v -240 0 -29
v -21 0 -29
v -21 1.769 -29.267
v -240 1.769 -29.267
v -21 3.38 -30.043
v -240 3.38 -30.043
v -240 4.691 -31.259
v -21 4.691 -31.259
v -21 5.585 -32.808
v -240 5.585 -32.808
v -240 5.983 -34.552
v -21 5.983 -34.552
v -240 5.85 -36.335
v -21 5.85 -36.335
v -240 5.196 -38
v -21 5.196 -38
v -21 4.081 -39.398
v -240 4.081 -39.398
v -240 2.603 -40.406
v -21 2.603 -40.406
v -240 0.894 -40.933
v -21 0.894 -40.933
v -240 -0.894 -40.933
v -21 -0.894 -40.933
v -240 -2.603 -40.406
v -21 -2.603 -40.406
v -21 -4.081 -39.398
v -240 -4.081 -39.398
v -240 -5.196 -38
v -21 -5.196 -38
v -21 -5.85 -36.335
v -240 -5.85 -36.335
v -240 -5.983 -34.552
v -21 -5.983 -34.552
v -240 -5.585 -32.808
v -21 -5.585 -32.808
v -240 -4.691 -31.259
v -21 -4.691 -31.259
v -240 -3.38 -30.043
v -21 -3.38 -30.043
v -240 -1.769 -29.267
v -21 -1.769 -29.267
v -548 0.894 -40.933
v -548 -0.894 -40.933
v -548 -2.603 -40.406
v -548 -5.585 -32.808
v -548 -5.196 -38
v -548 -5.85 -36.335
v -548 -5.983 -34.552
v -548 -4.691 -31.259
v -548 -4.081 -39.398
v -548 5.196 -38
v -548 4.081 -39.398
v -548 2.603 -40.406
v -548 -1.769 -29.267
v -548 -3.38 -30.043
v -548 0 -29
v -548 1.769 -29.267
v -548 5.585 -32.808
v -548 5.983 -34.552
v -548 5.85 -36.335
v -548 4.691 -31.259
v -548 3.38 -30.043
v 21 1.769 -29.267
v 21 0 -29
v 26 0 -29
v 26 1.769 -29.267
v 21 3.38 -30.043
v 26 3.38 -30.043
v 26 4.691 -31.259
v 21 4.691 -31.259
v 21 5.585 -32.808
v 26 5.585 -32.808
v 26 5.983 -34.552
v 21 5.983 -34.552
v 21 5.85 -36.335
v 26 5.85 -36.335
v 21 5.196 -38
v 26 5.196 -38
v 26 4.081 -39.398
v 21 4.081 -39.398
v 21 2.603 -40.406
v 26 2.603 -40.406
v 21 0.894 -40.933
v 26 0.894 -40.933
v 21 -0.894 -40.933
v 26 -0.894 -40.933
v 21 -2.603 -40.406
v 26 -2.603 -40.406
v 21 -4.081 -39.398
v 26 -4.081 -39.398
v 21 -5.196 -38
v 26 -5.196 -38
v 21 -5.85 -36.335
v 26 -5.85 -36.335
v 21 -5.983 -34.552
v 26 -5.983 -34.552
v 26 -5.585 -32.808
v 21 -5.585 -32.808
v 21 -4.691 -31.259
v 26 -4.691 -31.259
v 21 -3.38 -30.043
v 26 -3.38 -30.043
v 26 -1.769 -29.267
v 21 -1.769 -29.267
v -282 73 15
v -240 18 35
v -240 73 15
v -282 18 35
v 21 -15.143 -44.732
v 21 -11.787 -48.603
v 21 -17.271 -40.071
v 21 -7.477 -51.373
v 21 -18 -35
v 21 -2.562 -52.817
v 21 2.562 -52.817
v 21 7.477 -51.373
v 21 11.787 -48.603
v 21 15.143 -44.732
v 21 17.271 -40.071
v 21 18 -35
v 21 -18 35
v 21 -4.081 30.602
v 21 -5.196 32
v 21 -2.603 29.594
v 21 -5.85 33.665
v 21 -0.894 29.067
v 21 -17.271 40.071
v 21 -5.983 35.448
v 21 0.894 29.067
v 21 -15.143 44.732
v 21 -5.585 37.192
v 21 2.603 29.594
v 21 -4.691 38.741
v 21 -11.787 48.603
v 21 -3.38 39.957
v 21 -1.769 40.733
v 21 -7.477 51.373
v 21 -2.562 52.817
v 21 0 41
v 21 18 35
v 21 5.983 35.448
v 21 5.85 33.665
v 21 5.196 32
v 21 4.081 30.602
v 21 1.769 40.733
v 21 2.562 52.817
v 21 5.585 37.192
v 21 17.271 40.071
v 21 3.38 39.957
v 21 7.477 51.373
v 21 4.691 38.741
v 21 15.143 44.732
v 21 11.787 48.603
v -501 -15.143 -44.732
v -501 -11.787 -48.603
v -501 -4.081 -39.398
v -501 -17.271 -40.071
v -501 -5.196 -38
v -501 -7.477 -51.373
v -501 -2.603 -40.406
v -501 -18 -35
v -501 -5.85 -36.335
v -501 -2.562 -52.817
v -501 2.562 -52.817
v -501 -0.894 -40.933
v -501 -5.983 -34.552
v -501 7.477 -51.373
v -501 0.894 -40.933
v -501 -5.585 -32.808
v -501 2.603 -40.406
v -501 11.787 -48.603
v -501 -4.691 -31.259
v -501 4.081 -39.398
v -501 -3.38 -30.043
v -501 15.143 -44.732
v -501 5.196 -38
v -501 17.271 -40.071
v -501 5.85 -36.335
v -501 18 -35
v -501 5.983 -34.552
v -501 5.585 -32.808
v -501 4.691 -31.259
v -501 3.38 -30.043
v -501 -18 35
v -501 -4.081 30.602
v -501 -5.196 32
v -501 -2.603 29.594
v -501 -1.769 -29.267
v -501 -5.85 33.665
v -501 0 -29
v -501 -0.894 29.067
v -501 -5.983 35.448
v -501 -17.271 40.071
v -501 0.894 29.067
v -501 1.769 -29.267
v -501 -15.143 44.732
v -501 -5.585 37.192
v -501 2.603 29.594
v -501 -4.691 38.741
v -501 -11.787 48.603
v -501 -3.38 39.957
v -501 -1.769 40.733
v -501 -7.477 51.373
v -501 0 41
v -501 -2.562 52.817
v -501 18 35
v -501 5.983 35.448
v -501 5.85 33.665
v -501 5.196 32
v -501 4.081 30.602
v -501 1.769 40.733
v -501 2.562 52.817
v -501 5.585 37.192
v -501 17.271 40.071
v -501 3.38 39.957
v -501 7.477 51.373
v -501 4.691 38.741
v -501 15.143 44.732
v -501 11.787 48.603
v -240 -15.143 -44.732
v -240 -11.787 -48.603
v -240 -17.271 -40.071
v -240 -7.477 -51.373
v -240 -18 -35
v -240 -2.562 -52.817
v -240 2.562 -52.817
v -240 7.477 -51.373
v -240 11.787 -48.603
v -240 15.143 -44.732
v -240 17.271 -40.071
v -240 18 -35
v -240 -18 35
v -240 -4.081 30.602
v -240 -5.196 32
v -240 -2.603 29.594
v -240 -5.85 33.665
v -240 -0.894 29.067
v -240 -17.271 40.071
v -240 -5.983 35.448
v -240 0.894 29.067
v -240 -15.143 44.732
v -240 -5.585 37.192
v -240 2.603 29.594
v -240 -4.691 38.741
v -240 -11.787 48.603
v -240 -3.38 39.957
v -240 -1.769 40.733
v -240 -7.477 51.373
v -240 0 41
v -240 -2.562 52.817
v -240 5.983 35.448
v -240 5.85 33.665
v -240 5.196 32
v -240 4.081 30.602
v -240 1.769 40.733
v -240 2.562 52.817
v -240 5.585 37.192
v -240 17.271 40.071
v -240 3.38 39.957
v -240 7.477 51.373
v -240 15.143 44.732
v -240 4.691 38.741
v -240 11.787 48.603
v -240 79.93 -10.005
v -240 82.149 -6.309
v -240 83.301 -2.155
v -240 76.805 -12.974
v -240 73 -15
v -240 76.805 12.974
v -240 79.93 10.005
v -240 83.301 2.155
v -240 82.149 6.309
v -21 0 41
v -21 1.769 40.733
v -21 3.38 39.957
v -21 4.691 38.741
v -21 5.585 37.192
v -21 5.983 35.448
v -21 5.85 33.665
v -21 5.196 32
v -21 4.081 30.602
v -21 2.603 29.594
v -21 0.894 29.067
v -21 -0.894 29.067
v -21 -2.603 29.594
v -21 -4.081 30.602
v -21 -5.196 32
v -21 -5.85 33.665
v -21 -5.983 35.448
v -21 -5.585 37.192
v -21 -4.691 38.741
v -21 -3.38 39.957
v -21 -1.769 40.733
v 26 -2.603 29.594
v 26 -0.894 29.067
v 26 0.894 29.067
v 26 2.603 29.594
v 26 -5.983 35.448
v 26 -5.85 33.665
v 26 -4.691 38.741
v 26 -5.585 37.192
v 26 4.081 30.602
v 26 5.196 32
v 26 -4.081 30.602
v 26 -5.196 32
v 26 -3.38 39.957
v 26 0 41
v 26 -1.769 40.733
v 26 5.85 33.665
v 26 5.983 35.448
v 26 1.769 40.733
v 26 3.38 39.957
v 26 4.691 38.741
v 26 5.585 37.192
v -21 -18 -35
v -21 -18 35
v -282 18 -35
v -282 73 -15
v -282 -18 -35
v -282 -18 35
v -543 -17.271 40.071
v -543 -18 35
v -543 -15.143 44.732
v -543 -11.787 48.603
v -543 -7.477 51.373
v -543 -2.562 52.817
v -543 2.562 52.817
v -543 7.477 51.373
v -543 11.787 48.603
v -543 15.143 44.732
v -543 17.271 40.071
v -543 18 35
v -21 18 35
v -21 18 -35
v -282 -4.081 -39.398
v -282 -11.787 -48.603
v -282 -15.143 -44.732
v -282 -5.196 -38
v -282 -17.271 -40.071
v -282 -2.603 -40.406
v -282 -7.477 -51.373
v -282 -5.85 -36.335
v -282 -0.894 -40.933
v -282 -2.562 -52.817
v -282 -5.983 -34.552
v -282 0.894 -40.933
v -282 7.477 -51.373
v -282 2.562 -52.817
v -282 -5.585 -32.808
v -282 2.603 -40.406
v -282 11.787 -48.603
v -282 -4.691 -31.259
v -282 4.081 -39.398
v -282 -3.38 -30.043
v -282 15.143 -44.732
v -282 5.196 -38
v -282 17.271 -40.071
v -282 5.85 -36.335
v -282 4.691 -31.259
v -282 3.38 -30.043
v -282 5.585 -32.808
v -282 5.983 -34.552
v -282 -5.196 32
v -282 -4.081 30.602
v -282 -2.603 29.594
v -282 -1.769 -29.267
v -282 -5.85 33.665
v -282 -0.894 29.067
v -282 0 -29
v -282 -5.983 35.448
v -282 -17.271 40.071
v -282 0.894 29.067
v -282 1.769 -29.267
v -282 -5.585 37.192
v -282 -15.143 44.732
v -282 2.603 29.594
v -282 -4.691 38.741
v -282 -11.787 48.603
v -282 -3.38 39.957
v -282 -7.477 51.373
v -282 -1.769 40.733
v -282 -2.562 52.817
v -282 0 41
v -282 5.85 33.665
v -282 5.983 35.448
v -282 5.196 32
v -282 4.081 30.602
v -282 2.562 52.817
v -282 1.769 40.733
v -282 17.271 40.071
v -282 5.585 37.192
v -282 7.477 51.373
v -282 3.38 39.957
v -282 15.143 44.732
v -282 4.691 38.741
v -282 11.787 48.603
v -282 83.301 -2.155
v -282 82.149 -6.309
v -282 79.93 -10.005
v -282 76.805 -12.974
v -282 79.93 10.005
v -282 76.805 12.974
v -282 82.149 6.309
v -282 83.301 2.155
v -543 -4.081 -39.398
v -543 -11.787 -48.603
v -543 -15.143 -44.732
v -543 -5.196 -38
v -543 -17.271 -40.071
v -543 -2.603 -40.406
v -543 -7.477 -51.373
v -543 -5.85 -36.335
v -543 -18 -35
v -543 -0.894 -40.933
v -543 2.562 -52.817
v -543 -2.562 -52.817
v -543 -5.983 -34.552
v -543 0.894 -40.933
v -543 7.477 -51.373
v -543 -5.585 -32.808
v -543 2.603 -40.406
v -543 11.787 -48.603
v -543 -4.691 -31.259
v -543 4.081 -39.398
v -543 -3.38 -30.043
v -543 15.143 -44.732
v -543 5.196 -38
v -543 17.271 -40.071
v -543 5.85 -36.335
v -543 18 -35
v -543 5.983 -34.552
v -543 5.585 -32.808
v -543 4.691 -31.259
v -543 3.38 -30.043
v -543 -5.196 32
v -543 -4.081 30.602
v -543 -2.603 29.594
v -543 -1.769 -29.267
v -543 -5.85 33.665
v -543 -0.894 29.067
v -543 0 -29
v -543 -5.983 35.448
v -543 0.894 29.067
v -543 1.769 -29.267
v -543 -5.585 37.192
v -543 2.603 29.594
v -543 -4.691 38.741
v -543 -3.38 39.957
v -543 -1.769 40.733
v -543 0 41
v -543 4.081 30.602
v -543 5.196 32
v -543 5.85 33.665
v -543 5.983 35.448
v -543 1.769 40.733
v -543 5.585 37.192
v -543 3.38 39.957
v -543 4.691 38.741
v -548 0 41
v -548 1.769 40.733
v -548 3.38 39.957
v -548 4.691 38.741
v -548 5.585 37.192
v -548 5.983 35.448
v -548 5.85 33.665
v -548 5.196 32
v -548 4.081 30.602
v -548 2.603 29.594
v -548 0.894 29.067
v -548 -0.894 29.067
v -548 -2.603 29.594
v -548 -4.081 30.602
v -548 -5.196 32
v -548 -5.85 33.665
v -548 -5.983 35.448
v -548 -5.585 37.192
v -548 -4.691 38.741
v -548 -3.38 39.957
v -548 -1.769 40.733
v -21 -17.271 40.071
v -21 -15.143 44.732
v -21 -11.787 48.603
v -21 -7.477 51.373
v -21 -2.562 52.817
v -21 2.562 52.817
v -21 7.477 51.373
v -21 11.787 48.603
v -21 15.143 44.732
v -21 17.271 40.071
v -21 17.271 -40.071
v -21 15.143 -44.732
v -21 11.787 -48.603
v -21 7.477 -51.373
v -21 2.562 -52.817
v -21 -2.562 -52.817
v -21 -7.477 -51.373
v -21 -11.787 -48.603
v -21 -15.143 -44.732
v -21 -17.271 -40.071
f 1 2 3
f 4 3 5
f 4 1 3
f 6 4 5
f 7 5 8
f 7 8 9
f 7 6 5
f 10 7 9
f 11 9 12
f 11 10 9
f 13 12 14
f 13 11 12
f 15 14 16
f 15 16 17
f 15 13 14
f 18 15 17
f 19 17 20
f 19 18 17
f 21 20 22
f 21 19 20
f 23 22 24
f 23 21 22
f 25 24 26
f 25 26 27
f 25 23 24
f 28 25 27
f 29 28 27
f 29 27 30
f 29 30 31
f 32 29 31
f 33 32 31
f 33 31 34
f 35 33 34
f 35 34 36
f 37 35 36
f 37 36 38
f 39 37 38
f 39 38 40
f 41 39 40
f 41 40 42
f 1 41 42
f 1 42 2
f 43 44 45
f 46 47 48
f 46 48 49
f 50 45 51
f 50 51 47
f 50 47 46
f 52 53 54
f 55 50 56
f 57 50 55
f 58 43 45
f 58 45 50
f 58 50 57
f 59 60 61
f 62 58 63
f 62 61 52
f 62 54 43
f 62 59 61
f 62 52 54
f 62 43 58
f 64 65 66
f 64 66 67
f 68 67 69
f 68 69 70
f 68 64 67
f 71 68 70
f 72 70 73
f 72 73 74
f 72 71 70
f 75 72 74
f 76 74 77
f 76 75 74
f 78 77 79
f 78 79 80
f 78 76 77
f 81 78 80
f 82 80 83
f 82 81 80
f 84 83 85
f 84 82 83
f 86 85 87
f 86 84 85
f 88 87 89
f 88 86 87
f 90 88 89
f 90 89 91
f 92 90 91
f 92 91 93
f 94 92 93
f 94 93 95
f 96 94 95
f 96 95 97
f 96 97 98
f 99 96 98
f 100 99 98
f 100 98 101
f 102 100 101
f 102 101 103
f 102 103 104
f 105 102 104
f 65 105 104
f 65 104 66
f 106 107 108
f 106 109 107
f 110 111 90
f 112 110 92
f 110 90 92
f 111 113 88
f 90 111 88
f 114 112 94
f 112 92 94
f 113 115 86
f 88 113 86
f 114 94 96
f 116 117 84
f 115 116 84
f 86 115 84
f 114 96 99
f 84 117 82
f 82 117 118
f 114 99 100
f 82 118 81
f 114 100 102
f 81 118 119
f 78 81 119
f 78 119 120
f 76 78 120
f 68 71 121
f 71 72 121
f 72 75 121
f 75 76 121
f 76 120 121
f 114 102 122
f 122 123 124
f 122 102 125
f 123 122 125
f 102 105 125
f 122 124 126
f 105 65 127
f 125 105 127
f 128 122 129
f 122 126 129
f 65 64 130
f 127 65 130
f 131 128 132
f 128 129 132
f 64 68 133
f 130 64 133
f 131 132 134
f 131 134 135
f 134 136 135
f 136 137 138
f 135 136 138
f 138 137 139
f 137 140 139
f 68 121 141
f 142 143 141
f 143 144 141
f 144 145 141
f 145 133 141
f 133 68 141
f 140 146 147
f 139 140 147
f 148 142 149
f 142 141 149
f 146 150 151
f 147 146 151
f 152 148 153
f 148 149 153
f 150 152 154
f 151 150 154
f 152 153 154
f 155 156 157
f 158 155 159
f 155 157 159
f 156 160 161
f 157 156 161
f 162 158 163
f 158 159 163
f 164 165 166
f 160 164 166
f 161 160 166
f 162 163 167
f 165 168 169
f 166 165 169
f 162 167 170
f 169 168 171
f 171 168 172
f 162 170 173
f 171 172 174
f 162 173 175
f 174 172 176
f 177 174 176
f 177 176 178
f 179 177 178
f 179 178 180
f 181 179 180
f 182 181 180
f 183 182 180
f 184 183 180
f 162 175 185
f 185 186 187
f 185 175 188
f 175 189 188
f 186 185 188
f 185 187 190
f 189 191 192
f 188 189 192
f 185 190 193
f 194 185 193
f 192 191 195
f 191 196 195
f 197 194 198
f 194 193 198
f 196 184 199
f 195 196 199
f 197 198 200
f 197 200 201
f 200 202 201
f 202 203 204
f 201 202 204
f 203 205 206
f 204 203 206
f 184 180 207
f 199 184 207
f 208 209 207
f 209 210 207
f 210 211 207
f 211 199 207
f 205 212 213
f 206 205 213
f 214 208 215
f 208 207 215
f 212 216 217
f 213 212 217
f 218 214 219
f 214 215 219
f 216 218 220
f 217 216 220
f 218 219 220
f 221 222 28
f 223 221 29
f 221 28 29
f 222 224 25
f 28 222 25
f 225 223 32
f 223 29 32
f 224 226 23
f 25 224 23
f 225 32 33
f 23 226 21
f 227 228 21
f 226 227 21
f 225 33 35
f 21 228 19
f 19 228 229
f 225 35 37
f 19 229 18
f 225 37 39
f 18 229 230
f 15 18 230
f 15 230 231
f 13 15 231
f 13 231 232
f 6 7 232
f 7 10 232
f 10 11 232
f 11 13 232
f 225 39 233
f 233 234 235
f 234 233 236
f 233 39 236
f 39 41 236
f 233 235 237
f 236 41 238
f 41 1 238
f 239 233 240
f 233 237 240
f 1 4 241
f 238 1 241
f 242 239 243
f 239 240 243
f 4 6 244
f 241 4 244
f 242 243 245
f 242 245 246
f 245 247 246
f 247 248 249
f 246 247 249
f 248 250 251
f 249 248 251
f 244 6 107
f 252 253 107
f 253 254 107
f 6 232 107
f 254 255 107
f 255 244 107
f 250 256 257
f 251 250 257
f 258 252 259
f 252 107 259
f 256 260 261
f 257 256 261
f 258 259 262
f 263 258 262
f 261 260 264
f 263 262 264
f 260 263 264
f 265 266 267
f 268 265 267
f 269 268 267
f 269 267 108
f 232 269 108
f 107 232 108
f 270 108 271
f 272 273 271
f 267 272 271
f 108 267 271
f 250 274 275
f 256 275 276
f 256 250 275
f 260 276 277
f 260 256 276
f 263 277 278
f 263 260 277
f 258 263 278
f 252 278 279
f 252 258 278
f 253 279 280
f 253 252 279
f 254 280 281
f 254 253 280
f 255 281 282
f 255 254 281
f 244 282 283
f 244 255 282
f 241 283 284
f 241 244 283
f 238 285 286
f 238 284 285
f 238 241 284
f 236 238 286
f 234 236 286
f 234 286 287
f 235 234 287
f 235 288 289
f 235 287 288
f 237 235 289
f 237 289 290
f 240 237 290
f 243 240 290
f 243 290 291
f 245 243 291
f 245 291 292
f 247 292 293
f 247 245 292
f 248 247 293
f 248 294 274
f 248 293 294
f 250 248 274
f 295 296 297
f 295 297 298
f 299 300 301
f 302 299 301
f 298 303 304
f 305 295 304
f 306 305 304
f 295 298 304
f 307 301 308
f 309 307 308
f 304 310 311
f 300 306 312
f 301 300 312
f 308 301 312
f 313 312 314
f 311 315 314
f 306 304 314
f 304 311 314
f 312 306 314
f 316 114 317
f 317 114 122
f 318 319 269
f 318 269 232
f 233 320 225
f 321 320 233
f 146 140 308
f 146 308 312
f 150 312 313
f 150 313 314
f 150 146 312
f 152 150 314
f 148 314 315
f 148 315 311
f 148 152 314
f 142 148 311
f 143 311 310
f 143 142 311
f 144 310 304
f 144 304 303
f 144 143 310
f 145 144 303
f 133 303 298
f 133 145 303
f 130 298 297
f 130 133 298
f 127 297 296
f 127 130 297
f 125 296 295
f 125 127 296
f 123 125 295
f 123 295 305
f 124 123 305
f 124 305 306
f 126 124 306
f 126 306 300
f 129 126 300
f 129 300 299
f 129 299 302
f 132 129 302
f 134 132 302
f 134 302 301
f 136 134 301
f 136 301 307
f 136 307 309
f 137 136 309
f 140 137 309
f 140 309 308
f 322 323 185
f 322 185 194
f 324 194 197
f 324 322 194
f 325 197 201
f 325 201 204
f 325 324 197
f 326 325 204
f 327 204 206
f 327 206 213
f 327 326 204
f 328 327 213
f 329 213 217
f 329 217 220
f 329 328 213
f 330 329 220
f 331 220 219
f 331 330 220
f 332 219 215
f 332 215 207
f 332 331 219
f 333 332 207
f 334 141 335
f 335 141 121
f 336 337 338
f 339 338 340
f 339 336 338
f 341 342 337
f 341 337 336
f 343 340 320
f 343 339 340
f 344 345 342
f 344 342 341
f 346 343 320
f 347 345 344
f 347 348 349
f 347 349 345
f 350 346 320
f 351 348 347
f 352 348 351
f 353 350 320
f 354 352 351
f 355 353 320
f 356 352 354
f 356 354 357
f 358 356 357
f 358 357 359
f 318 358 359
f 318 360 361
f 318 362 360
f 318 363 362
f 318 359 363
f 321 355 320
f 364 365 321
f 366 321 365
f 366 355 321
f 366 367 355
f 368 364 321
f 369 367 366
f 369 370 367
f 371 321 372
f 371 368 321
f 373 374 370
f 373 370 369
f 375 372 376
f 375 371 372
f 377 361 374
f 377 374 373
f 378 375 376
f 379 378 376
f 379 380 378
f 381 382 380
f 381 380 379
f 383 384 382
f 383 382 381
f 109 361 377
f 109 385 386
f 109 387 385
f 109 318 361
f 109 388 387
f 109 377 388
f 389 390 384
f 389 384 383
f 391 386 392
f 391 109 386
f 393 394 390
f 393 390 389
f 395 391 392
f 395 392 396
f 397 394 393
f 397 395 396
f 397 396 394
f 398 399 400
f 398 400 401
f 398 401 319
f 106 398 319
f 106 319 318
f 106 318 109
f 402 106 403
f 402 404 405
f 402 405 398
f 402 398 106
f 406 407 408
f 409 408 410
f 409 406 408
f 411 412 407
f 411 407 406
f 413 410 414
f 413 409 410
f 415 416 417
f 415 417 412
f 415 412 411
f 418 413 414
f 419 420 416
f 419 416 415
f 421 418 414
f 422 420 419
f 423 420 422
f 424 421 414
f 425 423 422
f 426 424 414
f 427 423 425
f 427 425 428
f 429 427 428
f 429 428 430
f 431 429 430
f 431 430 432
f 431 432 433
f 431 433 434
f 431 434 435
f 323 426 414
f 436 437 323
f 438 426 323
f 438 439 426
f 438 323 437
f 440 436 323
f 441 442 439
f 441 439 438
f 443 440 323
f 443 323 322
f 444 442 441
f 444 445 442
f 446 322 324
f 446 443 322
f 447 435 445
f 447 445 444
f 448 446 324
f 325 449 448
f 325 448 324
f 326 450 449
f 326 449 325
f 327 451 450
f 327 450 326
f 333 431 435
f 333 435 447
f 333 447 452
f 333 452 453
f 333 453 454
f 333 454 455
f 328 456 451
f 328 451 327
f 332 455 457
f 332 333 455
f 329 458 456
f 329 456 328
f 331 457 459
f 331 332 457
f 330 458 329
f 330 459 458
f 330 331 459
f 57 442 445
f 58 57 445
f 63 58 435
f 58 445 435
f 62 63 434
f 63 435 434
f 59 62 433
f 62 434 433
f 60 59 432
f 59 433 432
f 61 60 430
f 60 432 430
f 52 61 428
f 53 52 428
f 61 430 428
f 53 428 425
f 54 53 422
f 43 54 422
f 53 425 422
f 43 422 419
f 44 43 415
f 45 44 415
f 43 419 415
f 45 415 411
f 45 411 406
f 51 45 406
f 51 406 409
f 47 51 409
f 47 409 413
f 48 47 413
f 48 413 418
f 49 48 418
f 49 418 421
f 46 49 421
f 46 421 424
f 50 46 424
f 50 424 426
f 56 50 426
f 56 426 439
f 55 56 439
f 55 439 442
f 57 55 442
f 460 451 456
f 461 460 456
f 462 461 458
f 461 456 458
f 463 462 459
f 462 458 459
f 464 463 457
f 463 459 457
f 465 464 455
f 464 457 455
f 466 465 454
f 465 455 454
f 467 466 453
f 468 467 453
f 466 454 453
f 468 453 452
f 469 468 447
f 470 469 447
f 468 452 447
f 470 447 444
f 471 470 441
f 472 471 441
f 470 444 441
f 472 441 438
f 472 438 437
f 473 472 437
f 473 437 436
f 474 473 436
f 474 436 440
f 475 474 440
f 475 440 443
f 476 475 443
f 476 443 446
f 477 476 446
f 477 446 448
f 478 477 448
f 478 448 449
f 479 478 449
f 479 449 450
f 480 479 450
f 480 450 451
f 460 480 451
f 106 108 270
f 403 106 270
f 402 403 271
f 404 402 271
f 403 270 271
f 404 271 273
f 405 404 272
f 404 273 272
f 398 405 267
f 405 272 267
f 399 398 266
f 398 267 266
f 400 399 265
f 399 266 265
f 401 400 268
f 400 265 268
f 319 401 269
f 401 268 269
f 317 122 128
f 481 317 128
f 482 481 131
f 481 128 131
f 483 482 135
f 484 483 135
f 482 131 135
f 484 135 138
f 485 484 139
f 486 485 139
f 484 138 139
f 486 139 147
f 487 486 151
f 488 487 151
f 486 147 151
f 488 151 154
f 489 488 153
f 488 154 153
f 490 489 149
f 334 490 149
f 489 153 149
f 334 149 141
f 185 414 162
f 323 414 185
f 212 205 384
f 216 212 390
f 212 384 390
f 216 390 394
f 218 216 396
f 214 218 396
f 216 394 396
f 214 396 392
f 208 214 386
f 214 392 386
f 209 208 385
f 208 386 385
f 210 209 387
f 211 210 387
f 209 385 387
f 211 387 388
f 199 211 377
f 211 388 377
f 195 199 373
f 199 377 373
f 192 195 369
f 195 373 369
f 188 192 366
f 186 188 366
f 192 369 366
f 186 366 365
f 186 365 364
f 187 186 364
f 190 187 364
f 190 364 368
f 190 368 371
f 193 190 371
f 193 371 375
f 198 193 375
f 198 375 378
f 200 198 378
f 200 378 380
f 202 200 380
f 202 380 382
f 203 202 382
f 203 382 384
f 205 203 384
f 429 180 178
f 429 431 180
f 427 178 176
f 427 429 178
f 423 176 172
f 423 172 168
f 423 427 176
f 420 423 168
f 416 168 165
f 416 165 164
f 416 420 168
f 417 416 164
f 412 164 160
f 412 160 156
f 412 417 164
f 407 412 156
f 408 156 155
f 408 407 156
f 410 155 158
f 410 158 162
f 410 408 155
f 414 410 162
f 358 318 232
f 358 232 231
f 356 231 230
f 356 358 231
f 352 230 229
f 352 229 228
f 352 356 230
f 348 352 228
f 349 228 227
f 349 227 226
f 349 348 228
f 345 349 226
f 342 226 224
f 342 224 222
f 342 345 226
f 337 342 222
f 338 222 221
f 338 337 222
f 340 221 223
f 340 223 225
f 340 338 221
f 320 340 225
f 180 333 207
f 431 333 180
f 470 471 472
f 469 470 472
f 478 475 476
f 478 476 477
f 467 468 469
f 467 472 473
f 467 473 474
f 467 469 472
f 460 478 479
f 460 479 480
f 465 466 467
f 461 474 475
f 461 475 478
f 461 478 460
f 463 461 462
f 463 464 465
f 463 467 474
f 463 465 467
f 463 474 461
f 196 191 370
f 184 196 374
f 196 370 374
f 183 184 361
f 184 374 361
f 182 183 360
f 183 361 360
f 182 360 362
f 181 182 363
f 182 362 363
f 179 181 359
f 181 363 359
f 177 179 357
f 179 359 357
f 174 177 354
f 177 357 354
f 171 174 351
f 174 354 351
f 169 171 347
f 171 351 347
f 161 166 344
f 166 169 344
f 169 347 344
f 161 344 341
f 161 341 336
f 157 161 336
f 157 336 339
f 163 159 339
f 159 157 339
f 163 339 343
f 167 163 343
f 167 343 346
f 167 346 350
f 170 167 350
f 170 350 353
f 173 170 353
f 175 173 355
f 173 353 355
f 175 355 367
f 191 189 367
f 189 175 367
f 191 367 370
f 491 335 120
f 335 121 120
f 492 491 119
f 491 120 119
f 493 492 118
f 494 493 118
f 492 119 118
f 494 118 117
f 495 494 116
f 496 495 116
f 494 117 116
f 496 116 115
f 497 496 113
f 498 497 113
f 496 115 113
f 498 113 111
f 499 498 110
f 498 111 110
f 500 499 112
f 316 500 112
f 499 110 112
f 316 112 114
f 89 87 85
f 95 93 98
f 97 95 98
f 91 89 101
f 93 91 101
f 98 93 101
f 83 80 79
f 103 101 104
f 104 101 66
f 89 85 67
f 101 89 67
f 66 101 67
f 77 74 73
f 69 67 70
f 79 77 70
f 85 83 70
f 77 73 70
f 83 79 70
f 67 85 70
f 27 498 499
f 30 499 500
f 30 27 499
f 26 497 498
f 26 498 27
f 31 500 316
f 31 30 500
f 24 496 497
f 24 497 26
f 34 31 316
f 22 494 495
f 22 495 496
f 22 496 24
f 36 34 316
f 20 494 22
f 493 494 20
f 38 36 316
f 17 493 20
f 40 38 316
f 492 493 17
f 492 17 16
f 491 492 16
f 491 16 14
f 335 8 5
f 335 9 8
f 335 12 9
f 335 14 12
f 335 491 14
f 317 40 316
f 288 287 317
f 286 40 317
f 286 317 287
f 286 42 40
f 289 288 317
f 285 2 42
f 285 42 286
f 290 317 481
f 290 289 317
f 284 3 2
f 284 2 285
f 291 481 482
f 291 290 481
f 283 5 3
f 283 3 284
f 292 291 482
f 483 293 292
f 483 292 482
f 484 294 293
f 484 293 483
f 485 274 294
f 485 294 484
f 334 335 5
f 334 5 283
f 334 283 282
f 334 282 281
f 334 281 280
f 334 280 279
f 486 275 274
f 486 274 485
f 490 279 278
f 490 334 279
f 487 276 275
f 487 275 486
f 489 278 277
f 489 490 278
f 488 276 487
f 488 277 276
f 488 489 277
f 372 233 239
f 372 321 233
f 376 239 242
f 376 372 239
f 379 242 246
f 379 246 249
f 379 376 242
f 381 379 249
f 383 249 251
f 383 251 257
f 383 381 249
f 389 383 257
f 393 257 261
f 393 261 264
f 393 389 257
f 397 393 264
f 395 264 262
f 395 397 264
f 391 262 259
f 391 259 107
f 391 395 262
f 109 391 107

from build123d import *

# Parameters (mm, degrees)
IZIM1_R                          = 6
Y_KSEKLIK_EKSTR_ZYON1_DEPTH      = 21
IZIM2_R                          = 6
Y_KSEKLIK_EKSTR_ZYON2_DEPTH      = 21
IZIM3_R                          = 6
Y_KSEKLIK_EKSTR_ZYON3_DEPTH      = 287
Y_KSEKLIK_EKSTR_ZYON3_DEPTH_BACK = 287
Y_KSEKLIK_EKSTR_ZYON4_DEPTH      = 42


with BuildPart() as part:
    # Çizim1 → Yükseklik-Ekstrüzyon1 (new body, symmetric)
    with BuildSketch(Plane(origin=(0, 0, 0), x_dir=(0, 0, -1), z_dir=(1, 0, 0))):
        with BuildLine():
            Line((-35, 18), (35, 18))
            ThreePointArc((35, 18), (53, 0), (35, -18))
            Line((35, -18), (-35, -18))
            ThreePointArc((-35, -18), (-53, 0), (-35, 18))
        make_face()
        with Locations((-35, 0)):
            Circle(IZIM1_R, mode=Mode.SUBTRACT)
        with Locations((35, 0)):
            Circle(IZIM1_R, mode=Mode.SUBTRACT)
    extrude(amount=Y_KSEKLIK_EKSTR_ZYON1_DEPTH, both=True)


with BuildPart() as body_2:
    # Çizim2 → Yükseklik-Ekstrüzyon2 (new body, symmetric)
    with BuildSketch(Plane.ZY.offset(261)):
        with BuildLine():
            Line((15, 73), (-15, 73))
            Line((-15, 73), (-35, 18))
            ThreePointArc((-35, 18), (-53, 0), (-35, -18))
            Line((-35, -18), (35, -18))
            ThreePointArc((35, -18), (53, 0), (35, 18))
            Line((35, 18), (15, 73))
        make_face()
        with Locations((35, 0)):
            Circle(IZIM2_R, mode=Mode.SUBTRACT)
        with Locations((-35, 0)):
            Circle(IZIM2_R, mode=Mode.SUBTRACT)
    extrude(amount=Y_KSEKLIK_EKSTR_ZYON2_DEPTH, both=True)


with BuildPart() as body_3:
    # Aynalama1: mirrored copy
    add(part.part.mirror(Plane.ZY.offset(261)))


with BuildPart() as part_1:
    add(part.part)

    add(body_2.part)  # Yükseklik-Ekstrüzyon3 merges body 2

    add(body_3.part)  # Yükseklik-Ekstrüzyon3 merges body 3
    # Çizim3 → Yükseklik-Ekstrüzyon3 (add, two sides)
    with BuildSketch(Plane.ZY.offset(261)) as y_kseklik_ekstr_zyon3_sk:
        with Locations((-35, 0)):
            Circle(IZIM3_R)
        with Locations((35, 0)):
            Circle(IZIM3_R)
    extrude(amount=Y_KSEKLIK_EKSTR_ZYON3_DEPTH)
    extrude(y_kseklik_ekstr_zyon3_sk.sketch, amount=-Y_KSEKLIK_EKSTR_ZYON3_DEPTH_BACK)

    # Çizim4 → Yükseklik-Ekstrüzyon4 (add)
    with BuildSketch(Plane(origin=(-240, 0, 0), x_dir=(0, 0, -1), z_dir=(1, 0, 0))):
        with BuildLine():
            ThreePointArc((-15, 73), (0, 83.446627943), (15, 73))
            Line((15, 73), (-15, 73))
        make_face()
    extrude(amount=-Y_KSEKLIK_EKSTR_ZYON4_DEPTH)


solid = part_1.part
